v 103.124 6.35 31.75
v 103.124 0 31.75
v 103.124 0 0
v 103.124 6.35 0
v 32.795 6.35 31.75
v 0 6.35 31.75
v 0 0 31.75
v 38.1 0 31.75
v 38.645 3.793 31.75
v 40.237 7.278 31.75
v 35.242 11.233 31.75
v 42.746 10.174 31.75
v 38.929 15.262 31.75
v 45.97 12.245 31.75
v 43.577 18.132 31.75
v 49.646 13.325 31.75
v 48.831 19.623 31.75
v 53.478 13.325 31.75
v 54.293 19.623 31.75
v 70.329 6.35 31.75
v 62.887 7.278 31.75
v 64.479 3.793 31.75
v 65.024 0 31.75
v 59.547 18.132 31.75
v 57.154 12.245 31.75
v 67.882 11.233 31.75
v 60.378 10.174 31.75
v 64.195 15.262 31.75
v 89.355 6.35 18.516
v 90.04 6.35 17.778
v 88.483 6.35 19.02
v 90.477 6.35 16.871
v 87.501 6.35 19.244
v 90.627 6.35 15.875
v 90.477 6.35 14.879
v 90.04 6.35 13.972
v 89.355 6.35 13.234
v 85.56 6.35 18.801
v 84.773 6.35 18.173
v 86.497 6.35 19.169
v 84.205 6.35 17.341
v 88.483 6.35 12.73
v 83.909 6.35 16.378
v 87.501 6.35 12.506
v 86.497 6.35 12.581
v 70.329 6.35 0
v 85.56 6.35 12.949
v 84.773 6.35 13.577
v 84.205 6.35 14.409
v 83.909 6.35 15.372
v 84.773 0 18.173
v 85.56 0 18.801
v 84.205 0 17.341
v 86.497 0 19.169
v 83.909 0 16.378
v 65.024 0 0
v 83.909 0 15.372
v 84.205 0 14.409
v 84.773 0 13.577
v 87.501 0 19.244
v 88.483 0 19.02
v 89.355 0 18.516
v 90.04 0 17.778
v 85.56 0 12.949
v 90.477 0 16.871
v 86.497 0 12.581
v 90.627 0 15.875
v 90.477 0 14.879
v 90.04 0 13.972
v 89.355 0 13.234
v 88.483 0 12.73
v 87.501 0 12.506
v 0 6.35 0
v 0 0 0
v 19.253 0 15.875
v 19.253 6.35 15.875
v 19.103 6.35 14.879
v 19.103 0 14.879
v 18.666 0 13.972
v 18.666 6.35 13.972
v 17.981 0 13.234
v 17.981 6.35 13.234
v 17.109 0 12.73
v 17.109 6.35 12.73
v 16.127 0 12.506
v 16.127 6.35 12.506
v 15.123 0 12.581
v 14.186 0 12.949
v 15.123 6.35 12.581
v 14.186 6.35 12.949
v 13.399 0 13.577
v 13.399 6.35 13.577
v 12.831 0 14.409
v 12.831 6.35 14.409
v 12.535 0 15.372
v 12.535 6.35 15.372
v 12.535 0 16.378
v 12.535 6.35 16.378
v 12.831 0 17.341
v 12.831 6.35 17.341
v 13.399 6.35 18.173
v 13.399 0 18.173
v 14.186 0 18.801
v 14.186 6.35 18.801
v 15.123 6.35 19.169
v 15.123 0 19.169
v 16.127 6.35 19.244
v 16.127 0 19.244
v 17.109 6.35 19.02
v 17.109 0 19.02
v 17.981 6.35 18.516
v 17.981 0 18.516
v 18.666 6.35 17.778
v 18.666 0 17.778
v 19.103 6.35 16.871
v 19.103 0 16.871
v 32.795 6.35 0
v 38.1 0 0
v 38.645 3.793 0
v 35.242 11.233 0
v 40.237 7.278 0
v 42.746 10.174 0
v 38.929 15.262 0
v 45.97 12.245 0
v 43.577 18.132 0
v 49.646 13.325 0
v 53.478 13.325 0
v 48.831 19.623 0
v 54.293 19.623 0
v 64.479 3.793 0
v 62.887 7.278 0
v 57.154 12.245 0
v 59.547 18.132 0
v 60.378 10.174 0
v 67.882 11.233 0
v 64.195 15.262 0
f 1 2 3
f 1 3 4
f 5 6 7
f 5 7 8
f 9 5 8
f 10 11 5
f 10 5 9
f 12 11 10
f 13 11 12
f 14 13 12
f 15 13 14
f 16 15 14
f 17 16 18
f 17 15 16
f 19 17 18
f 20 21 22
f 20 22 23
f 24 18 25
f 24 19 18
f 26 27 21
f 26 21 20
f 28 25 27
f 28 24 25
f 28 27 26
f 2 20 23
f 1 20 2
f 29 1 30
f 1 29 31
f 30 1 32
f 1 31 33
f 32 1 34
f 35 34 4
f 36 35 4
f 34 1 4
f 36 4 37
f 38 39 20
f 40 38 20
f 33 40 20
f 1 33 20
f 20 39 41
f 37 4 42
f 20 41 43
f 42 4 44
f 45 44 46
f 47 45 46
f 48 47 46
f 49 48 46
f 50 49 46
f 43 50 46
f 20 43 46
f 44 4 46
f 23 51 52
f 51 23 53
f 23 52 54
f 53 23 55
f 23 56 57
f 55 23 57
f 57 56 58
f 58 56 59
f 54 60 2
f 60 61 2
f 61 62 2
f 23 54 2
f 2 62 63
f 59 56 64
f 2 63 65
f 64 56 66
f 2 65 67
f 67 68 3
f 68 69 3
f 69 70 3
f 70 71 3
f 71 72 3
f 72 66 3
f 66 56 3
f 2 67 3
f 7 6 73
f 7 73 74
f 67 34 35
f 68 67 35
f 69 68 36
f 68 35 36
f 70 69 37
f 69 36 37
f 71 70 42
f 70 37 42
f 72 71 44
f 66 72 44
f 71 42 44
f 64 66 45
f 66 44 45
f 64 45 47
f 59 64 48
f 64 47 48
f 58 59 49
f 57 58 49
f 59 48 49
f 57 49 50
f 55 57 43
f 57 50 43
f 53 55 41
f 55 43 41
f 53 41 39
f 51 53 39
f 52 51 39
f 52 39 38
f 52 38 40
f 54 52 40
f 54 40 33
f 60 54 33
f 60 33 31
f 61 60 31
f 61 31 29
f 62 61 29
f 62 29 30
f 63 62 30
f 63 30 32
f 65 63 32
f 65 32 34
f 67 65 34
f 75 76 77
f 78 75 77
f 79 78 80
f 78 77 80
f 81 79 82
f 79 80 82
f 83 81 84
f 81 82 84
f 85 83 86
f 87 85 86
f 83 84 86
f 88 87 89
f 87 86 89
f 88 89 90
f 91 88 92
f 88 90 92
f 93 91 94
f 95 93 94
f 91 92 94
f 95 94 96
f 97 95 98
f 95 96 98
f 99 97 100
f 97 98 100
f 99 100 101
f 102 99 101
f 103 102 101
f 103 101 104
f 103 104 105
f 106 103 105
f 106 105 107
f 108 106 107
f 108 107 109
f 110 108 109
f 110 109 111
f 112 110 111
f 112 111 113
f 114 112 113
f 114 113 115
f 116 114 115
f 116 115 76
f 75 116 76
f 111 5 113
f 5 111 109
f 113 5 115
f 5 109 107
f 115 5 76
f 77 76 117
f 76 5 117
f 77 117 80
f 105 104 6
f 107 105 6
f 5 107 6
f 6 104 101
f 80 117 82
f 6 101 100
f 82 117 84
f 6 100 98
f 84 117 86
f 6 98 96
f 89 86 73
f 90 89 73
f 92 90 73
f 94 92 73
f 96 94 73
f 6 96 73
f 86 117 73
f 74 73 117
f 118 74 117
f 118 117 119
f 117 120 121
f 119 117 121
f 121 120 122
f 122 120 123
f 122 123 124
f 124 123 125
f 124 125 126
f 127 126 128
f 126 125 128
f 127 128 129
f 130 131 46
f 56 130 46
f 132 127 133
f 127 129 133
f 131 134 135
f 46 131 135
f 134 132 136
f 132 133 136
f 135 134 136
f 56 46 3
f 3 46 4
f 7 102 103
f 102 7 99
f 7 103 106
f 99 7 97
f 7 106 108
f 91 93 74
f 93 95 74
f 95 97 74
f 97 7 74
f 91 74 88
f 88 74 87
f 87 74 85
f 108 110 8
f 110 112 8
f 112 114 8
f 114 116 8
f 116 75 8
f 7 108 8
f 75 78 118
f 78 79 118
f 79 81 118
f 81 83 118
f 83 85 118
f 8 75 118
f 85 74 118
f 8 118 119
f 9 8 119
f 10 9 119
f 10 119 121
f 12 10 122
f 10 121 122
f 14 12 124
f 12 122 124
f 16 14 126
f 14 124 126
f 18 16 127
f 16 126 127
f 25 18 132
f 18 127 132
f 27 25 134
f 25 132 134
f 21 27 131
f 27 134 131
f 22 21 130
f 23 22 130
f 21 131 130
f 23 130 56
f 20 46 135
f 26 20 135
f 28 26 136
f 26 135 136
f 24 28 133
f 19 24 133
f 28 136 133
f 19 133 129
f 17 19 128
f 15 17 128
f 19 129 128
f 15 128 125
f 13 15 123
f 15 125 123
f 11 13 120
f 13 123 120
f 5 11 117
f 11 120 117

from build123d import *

# Parameters (mm, degrees)
BOSS_EXTRUDE1_DEPTH = 31.75
SKETCH3_R           = 3.3782
CUT_EXTRUDE1_DEPTH  = 7.35


with BuildPart() as part:
    # Sketch1 → Boss-Extrude1 (new body)
    with BuildSketch(Plane.XY):
        with BuildLine():
            Line((32.795198354, 6.35), (0, 6.35))
            Line((0, 6.35), (0, 0))
            Line((0, 0), (38.1, 0))
            ThreePointArc((38.1, 0), (51.562, 13.462), (65.024, 0))
            Line((65.024, 0), (103.124, 0))
            Line((103.124, 0), (103.124, 6.35))
            Line((103.124, 6.35), (70.328801646, 6.35))
            ThreePointArc((70.328801646, 6.35), (51.562, 19.812), (32.795198354, 6.35))
        make_face()
    extrude(amount=BOSS_EXTRUDE1_DEPTH)

    # Sketch3 → Cut-Extrude1 (cut, through all)
    with BuildSketch(Plane(origin=(0, 6.35, 0), x_dir=(1, 0, 0), z_dir=(0, 1, 0))):
        with Locations((15.875, -15.875)):
            Circle(SKETCH3_R)
        with Locations((87.249, -15.875)):
            Circle(SKETCH3_R)
    extrude(amount=-CUT_EXTRUDE1_DEPTH, mode=Mode.SUBTRACT)


solid = part.part
